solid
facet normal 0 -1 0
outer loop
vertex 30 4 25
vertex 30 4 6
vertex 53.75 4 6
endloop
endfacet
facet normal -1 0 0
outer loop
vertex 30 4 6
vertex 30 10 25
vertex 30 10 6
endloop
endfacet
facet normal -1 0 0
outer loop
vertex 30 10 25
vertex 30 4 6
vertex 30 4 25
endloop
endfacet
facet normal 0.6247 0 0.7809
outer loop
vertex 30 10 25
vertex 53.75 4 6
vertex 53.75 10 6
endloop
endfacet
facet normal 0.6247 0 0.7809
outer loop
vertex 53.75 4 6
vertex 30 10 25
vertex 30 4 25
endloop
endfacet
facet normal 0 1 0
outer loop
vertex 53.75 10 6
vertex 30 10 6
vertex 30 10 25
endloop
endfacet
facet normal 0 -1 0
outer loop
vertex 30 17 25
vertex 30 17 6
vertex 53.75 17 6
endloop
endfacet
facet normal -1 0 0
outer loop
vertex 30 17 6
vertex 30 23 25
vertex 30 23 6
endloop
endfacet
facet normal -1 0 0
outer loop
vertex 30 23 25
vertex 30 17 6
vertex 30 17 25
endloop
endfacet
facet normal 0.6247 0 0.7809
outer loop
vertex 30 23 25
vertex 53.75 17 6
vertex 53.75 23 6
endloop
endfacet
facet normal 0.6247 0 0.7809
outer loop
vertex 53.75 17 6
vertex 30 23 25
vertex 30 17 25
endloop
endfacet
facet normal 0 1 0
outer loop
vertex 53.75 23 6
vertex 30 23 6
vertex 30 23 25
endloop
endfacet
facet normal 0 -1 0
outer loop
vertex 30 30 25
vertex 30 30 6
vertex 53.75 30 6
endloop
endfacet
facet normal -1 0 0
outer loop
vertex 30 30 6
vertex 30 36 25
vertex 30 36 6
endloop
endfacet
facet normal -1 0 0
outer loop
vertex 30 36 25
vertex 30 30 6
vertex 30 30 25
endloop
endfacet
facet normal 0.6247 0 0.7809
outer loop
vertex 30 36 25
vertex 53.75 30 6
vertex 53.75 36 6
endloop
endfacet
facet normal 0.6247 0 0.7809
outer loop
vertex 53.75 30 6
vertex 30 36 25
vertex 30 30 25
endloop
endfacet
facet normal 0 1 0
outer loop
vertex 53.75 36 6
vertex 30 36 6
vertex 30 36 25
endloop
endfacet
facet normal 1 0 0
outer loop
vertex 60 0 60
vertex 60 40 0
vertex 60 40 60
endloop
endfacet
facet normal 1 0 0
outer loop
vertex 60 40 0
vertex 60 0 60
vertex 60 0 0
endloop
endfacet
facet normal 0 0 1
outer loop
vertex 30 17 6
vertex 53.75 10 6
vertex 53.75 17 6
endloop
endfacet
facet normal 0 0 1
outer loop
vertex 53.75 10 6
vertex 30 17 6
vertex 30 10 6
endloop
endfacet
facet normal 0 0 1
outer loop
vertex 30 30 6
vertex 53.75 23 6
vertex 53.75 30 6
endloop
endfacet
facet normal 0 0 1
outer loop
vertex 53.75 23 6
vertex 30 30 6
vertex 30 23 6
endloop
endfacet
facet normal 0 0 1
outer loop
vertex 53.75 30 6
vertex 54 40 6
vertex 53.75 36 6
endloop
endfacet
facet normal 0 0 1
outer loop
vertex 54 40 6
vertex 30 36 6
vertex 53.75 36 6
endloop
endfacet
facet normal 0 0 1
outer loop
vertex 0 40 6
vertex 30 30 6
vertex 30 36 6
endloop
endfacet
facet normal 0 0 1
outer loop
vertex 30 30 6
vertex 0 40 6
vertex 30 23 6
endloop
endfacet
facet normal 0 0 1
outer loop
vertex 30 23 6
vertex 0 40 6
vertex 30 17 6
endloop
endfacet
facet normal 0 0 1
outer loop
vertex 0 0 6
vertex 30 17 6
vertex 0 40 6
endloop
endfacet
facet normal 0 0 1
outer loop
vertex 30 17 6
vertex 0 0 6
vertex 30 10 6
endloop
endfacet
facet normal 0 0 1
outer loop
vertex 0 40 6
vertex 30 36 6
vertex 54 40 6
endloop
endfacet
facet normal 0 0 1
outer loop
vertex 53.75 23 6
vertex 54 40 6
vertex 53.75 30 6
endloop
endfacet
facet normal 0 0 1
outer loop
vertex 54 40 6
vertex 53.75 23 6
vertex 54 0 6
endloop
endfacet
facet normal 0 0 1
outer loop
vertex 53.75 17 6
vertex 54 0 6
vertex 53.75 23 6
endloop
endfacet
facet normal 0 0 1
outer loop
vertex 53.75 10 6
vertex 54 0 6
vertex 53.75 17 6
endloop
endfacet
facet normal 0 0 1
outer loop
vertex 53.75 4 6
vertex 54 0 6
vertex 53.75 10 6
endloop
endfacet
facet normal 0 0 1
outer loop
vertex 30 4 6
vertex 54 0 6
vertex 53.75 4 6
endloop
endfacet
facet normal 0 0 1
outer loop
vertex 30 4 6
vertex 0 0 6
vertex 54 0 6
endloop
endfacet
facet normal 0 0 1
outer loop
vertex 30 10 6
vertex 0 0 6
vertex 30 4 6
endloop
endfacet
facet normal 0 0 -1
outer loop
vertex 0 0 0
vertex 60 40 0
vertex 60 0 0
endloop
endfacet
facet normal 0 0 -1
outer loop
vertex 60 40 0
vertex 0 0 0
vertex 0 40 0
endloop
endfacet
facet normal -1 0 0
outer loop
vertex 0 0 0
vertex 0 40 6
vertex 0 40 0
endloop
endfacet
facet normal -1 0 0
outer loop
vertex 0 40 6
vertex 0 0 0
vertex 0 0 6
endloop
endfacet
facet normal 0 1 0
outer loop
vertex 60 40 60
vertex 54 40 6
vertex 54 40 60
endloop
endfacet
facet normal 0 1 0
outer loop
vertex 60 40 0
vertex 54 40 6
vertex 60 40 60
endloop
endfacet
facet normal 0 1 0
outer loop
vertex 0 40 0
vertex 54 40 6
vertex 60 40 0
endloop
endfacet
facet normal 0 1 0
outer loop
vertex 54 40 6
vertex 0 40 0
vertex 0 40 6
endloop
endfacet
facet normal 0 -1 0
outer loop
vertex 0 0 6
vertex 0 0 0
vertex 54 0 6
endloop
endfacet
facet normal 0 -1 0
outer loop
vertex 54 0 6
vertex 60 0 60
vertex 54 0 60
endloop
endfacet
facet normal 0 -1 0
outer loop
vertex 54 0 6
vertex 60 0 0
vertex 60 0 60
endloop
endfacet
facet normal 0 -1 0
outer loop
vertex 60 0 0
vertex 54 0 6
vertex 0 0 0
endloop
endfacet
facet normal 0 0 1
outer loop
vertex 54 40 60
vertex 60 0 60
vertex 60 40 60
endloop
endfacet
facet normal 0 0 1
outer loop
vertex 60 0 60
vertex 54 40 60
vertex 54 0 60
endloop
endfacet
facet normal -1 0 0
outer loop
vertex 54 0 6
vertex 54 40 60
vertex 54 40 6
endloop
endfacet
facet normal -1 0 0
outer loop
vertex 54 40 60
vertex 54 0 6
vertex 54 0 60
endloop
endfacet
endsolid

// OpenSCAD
$fn = 32;

// ----------------------------------------------------------------------
// Rib bracket: 3-gusset L bracket
// ----------------------------------------------------------------------

// --- parameters (mm) ---
base_l = 60;              // foot length, X
base_w = 40;              // foot width, Y
base_t = 6;               // foot thickness
plate_t = 6;              // upright plate thickness
plate_h = 60;             // overall height
gus_l = 24;               // gusset leg along the foot
gus_h = 20;               // gusset height
gus_t = 6;                // gusset thickness
gus_edge = 4;             // gusset margin from the foot edge
n_gus = 3;                // gusset count

gus_pitch = (base_w - 2 * gus_edge - gus_t) / (n_gus - 1);  // gusset pitch

union() {
  cube([base_l, base_w, base_t]);
  translate([base_l - plate_t, 0, base_t - 1])
    cube([plate_t, base_w, plate_h - base_t + 1]);
  for (i = [0 : n_gus - 1])
    translate([base_l - plate_t - gus_l, gus_edge + i * gus_pitch, base_t - 1])
      rotate([-90, 0, 0])
        linear_extrude(height = gus_t)
          polygon(points = [[0, 0], [gus_l + 1, 0], [0, -gus_h]]);
}
